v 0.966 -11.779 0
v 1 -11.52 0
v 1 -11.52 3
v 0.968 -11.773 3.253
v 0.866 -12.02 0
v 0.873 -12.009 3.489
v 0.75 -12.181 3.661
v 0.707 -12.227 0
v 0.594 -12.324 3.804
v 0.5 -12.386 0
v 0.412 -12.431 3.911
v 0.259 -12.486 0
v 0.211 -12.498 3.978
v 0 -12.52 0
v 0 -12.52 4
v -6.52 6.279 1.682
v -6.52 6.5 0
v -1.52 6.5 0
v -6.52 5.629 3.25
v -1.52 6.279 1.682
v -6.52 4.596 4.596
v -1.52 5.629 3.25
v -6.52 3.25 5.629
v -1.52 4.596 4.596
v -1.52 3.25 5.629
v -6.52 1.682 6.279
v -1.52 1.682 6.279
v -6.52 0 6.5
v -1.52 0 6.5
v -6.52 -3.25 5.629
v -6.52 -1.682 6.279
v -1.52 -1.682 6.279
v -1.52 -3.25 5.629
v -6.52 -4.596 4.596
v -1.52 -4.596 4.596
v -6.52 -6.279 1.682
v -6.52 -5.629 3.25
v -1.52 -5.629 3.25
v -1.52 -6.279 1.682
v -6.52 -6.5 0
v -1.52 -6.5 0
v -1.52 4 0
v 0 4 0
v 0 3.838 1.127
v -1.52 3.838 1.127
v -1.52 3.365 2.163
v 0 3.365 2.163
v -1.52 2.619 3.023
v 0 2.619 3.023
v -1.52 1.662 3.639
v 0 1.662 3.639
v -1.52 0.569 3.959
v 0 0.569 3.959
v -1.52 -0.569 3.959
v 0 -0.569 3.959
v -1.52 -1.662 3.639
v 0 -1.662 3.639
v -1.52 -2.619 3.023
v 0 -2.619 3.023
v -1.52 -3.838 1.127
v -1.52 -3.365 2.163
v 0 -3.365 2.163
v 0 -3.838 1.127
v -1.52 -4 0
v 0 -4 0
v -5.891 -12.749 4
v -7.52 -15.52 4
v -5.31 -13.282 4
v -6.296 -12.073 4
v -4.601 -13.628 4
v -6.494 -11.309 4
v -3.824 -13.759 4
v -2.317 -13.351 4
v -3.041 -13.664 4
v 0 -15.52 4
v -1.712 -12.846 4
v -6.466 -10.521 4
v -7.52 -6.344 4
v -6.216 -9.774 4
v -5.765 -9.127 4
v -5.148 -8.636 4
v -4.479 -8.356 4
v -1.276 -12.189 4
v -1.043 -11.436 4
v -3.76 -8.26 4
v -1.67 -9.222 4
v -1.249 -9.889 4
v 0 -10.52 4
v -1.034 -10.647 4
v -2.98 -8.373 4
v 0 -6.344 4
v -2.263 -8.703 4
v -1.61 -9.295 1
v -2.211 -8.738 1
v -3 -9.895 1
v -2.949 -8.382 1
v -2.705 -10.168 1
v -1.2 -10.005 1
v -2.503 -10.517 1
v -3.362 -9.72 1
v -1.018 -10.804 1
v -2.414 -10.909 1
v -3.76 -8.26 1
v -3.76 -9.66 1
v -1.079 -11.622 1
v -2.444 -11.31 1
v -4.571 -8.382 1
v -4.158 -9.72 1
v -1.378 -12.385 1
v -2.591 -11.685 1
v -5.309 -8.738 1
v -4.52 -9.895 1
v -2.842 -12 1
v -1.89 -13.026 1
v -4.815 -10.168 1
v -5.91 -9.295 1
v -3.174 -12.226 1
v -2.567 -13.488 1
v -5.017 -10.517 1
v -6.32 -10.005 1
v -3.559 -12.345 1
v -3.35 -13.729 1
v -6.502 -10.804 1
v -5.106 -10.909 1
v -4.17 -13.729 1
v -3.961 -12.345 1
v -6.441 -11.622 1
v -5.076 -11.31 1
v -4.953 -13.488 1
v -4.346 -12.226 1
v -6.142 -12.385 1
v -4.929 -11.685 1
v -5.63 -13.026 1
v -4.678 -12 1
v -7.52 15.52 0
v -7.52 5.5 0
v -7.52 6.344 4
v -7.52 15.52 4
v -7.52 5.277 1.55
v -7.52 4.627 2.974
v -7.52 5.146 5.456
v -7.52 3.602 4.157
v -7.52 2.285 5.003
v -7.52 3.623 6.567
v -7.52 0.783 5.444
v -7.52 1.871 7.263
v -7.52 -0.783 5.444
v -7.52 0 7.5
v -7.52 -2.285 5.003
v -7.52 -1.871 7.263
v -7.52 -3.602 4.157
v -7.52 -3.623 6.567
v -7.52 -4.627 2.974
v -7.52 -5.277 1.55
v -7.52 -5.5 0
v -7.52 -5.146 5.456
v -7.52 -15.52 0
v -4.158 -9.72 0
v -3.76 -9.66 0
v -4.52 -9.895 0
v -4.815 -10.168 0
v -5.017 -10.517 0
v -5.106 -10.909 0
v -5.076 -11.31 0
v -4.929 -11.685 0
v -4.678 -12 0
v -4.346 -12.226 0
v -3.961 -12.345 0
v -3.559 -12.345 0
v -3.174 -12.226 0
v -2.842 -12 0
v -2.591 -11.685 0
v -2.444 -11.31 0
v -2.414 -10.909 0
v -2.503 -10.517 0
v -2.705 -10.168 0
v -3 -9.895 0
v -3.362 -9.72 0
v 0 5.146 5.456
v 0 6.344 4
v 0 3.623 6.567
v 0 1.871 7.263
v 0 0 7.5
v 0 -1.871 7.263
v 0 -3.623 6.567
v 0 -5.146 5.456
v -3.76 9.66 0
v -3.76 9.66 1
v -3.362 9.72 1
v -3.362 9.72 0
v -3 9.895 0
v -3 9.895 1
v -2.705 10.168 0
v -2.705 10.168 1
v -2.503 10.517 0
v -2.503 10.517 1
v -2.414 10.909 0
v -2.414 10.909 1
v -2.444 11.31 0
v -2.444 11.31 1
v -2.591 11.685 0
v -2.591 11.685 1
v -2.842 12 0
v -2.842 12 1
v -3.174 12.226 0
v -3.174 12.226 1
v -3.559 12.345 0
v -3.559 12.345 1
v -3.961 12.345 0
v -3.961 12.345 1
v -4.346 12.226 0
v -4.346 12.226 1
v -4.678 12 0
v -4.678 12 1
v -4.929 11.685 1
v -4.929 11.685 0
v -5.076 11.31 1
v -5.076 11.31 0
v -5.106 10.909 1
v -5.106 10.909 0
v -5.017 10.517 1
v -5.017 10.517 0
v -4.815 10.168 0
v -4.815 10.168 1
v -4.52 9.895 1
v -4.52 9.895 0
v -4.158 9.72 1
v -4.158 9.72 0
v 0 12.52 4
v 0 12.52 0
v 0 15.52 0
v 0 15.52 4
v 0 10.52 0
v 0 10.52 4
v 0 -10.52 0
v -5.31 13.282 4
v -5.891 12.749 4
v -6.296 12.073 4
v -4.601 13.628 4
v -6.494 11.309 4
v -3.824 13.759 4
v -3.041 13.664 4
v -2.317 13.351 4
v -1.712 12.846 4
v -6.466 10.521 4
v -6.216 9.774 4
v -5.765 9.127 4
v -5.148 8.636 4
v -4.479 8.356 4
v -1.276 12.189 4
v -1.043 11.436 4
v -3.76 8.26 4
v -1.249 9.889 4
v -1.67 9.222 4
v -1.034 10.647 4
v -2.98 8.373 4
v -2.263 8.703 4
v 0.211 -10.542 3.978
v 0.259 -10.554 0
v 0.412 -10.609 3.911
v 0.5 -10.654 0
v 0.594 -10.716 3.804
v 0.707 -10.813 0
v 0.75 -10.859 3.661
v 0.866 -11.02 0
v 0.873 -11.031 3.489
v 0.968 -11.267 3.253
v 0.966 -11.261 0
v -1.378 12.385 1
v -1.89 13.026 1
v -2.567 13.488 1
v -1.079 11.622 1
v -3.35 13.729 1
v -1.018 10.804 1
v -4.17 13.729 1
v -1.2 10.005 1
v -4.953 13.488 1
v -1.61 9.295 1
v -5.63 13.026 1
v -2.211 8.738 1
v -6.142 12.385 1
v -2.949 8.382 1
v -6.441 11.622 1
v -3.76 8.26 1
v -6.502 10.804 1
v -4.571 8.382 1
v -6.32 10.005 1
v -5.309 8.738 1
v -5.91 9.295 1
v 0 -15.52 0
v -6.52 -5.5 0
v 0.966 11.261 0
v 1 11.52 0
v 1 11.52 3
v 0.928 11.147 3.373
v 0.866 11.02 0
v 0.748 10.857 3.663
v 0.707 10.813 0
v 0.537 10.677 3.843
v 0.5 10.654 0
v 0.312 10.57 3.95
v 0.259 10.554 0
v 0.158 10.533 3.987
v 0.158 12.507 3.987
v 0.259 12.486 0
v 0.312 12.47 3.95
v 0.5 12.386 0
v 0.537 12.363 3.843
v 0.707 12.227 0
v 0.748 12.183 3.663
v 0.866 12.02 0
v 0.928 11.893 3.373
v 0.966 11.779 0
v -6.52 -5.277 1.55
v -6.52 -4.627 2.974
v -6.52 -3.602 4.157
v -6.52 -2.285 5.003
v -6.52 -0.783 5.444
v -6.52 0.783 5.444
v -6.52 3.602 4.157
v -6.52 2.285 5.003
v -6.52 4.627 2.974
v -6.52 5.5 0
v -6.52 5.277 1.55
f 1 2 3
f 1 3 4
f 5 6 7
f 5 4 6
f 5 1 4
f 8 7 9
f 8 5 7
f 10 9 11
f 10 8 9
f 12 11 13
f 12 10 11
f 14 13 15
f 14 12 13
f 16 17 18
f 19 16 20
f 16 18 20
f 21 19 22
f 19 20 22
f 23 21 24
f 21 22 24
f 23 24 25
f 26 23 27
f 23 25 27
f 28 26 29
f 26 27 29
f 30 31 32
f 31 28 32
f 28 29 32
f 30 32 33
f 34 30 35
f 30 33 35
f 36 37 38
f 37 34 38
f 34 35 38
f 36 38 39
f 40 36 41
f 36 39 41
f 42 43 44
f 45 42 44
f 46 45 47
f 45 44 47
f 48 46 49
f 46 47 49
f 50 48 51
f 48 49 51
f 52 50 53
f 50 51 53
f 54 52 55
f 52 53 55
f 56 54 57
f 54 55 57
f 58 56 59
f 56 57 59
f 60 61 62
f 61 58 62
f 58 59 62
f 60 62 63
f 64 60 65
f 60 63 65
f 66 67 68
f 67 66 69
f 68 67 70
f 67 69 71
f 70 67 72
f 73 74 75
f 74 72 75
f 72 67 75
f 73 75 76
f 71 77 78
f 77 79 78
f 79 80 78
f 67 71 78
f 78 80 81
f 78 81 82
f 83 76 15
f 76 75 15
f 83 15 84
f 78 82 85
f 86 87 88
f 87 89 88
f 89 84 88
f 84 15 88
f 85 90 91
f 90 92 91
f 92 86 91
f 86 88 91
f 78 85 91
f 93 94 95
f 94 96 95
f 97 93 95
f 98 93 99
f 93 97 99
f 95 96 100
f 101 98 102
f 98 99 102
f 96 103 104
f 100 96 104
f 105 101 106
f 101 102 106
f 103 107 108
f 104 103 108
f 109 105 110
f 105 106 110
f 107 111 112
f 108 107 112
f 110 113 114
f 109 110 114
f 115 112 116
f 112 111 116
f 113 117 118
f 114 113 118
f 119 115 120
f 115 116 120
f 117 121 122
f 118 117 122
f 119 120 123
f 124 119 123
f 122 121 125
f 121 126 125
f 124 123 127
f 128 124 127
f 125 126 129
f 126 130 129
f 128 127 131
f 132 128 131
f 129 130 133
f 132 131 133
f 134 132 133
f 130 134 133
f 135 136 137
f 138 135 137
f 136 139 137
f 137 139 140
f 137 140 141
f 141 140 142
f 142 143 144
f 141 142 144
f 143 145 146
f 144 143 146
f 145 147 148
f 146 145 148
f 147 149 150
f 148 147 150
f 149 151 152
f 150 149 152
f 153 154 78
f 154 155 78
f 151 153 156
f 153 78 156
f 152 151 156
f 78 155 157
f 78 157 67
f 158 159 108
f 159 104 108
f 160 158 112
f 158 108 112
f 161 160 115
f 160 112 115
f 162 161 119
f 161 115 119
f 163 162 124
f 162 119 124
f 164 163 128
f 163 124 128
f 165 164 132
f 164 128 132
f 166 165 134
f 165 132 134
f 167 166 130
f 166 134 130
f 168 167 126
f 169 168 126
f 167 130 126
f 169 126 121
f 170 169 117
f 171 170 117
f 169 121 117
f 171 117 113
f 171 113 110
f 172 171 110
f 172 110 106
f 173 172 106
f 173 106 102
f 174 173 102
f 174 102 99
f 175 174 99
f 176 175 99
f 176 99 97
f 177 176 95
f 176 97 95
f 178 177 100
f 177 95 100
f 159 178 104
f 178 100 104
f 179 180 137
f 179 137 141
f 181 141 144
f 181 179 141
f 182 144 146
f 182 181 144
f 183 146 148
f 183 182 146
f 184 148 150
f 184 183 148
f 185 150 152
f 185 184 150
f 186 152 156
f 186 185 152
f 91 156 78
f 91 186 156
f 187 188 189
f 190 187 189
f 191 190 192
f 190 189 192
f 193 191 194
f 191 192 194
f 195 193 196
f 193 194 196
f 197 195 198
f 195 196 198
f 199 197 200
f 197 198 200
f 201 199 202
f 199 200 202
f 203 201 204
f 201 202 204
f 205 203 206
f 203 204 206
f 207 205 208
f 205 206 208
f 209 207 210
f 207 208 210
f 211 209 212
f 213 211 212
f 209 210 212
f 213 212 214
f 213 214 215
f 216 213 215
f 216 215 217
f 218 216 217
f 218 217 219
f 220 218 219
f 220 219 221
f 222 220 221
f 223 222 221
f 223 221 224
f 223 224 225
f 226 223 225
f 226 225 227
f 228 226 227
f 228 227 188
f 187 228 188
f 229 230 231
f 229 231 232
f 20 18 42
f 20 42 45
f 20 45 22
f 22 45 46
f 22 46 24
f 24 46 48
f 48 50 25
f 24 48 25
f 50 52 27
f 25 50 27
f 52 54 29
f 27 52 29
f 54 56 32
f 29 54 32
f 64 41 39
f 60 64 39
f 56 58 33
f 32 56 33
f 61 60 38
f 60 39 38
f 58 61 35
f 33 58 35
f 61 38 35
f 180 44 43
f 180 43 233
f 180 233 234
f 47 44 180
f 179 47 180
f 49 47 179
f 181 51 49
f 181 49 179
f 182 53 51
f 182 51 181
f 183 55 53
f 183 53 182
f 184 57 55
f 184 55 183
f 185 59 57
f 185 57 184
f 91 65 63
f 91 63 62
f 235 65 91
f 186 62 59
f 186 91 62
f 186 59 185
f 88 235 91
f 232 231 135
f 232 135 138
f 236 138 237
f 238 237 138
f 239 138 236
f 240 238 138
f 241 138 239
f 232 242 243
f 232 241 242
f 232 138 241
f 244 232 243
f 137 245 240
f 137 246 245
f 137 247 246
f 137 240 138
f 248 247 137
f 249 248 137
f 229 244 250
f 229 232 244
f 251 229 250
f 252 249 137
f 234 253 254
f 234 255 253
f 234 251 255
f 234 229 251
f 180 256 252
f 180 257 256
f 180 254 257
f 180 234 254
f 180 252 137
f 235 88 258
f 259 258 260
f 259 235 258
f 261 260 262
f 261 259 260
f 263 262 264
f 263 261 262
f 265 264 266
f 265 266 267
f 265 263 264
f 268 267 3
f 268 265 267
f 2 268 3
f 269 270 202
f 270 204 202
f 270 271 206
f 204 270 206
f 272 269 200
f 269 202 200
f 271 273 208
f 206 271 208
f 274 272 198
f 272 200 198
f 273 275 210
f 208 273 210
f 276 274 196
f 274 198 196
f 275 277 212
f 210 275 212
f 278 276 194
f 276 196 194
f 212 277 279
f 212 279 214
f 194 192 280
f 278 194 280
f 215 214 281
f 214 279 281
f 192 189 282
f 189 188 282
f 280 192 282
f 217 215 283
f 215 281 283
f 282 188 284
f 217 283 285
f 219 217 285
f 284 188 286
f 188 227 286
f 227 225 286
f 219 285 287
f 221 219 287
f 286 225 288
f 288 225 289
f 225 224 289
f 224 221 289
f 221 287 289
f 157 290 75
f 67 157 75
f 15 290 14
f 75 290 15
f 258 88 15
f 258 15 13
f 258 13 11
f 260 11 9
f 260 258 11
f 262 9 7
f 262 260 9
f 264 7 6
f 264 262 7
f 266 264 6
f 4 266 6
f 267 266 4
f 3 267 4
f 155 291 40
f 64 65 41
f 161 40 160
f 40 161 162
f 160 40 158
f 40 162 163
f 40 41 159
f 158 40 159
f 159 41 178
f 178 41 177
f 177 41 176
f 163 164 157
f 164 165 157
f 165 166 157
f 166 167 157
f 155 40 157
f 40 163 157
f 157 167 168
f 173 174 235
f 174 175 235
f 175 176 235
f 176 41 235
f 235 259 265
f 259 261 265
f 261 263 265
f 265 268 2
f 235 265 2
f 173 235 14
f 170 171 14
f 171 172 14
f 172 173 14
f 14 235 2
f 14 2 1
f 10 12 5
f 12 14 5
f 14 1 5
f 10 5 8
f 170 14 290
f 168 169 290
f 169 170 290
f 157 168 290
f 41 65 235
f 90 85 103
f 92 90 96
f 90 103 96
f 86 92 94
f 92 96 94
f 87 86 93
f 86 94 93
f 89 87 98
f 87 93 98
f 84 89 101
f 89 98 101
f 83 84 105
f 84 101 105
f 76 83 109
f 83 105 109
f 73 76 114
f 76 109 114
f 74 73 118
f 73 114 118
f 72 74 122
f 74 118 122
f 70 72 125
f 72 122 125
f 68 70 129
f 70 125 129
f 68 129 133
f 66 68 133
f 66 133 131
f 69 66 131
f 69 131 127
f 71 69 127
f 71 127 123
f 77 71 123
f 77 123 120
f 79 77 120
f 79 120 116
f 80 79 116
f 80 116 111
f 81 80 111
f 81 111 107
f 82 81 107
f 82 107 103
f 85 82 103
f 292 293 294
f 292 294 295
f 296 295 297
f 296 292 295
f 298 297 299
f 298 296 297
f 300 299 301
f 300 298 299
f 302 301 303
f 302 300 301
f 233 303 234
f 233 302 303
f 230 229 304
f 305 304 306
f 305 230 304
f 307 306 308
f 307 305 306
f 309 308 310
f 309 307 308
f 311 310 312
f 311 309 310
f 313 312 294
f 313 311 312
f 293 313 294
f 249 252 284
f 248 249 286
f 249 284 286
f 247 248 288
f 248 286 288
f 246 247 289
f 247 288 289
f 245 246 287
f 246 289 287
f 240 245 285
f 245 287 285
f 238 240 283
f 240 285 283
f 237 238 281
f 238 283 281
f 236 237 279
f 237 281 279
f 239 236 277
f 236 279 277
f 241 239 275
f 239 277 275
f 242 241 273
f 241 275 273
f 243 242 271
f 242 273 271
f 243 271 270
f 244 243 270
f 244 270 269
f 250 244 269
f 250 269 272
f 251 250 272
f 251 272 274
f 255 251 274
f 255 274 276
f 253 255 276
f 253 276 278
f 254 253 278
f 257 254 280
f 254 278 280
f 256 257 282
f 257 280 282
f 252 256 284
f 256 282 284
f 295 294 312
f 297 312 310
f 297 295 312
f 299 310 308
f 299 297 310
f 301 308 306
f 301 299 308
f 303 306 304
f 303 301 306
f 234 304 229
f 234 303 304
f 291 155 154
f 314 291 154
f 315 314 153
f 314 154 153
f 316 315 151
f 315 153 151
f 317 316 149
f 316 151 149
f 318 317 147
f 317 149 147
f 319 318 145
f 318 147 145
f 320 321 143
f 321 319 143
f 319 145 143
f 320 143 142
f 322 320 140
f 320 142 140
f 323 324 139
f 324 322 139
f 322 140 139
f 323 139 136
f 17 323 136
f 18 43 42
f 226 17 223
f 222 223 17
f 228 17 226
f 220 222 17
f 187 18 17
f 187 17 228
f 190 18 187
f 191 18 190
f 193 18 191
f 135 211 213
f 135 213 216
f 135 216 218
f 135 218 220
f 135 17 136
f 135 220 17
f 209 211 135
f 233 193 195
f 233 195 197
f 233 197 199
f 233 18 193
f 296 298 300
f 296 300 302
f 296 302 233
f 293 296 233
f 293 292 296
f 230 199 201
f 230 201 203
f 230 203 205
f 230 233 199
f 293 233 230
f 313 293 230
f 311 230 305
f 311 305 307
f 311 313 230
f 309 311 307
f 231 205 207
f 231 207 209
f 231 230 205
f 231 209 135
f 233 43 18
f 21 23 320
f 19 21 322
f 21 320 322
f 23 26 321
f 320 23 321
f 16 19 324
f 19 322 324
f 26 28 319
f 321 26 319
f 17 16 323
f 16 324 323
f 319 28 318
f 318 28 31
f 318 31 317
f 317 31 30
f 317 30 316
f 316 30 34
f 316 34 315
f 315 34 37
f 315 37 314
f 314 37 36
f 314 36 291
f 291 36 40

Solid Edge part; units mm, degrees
sketch "Sketch1" plane through (0, 0, 0) normal (1, 0, 0) x (0, 1, 0)
  line L0 (6.5, 0) -> (15.52, 0)
  line L1 (15.52, 0) -> (15.52, 4)
  line L2 (15.52, 4) -> (6.3443, 4)
  line L3 (-15.52, 4) -> (-6.3443, 4)
  line L4 (-15.52, 0) -> (-15.52, 4)
  line L5 (-6.5, 0) -> (-15.52, 0)
  arc A0 (-6.5, 0) -> (6.5, 0) centre (0, 0) cw
  arc A1 (6.3443, 4) -> (-6.3443, 4) centre (0, 0) ccw
  dimension "D1" = 15.52
  dimension "D2" = 9.02
  dimension "D3" = 9.02
  dimension "D4" = 9.1757
  dimension "D5" = 4
  dimension "D6" = 9.1757
extrude "Protrusion1" add sketch "Sketch1" against normal blind 7.52
hole "Bohrung_1" at (-3.76, 11.01, 4) direction (0, 0, -1) diameter 2.7 end through all counterbore diameter 5.5 counterbore depth 3
mirror "Mirror1" about plane through (0, 0, 0) normal (0, -1, 0) of "Bohrung_1"
sketch "Sketch2" plane through (0, 0, 3.75) normal (1, 0, 0) x (0, 1, 0)
  line L0 (-6.5, -3.75) -> (-4, -3.75)
  line L1 (4, -3.75) -> (6.5, -3.75)
  arc A0 (-4, -3.75) -> (4, -3.75) centre (0, -3.75) cw
  arc A1 (6.5, -3.75) -> (-6.5, -3.75) centre (0, -3.75) ccw
extrude "Extrusionsausprägung_2" add sketch "Sketch2" against normal blind 1.52
sketch "Sketch3" plane through (-7.52, 0, 3.75) normal (-1, 0, 0) x (0, -1, 0)
  line L0 (-6.5, -3.75) -> (-5.5, -3.75)
  line L1 (5.5, -3.75) -> (6.5, -3.75)
  arc A0 (-5.5, -3.75) -> (5.5, -3.75) centre (0, -3.75) cw
  arc A1 (6.5, -3.75) -> (-6.5, -3.75) centre (0, -3.75) ccw
extrude "Extrusionsausprägung_3" add sketch "Sketch3" against normal blind 1
sketch "Sketch4" plane through (-3.76, 12.52, 2) normal (0, 1, 0) x (-1, 0, 0)
  line L0 (-3.76, 2) -> (-4.76, 2)
  line L1 (-4.76, 2) -> (-4.76, -2)
  line L2 (-4.76, -2) -> (-3.76, -2)
  line L3 (-3.76, -2) -> (-3.76, 2)
  dimension "D1" = 1
extrude "Extrusionsausprägung_4" add sketch "Sketch4" against normal blind 2
fillet "Verrundung_1" radius 1 3 edges at (1, 11.52, 4) (1, 12.52, 2) (1, 10.52, 2)
mirror "Mirror2" about plane through (0, 0, 0) normal (0, -1, 0) of "Extrusionsausprägung_4"
fillet "Round1" radius 1 3 edges at (1, -11.52, 4) (1, -12.52, 2) (1, -10.52, 2)
properties material "Plastic ABS (extra strong)"
